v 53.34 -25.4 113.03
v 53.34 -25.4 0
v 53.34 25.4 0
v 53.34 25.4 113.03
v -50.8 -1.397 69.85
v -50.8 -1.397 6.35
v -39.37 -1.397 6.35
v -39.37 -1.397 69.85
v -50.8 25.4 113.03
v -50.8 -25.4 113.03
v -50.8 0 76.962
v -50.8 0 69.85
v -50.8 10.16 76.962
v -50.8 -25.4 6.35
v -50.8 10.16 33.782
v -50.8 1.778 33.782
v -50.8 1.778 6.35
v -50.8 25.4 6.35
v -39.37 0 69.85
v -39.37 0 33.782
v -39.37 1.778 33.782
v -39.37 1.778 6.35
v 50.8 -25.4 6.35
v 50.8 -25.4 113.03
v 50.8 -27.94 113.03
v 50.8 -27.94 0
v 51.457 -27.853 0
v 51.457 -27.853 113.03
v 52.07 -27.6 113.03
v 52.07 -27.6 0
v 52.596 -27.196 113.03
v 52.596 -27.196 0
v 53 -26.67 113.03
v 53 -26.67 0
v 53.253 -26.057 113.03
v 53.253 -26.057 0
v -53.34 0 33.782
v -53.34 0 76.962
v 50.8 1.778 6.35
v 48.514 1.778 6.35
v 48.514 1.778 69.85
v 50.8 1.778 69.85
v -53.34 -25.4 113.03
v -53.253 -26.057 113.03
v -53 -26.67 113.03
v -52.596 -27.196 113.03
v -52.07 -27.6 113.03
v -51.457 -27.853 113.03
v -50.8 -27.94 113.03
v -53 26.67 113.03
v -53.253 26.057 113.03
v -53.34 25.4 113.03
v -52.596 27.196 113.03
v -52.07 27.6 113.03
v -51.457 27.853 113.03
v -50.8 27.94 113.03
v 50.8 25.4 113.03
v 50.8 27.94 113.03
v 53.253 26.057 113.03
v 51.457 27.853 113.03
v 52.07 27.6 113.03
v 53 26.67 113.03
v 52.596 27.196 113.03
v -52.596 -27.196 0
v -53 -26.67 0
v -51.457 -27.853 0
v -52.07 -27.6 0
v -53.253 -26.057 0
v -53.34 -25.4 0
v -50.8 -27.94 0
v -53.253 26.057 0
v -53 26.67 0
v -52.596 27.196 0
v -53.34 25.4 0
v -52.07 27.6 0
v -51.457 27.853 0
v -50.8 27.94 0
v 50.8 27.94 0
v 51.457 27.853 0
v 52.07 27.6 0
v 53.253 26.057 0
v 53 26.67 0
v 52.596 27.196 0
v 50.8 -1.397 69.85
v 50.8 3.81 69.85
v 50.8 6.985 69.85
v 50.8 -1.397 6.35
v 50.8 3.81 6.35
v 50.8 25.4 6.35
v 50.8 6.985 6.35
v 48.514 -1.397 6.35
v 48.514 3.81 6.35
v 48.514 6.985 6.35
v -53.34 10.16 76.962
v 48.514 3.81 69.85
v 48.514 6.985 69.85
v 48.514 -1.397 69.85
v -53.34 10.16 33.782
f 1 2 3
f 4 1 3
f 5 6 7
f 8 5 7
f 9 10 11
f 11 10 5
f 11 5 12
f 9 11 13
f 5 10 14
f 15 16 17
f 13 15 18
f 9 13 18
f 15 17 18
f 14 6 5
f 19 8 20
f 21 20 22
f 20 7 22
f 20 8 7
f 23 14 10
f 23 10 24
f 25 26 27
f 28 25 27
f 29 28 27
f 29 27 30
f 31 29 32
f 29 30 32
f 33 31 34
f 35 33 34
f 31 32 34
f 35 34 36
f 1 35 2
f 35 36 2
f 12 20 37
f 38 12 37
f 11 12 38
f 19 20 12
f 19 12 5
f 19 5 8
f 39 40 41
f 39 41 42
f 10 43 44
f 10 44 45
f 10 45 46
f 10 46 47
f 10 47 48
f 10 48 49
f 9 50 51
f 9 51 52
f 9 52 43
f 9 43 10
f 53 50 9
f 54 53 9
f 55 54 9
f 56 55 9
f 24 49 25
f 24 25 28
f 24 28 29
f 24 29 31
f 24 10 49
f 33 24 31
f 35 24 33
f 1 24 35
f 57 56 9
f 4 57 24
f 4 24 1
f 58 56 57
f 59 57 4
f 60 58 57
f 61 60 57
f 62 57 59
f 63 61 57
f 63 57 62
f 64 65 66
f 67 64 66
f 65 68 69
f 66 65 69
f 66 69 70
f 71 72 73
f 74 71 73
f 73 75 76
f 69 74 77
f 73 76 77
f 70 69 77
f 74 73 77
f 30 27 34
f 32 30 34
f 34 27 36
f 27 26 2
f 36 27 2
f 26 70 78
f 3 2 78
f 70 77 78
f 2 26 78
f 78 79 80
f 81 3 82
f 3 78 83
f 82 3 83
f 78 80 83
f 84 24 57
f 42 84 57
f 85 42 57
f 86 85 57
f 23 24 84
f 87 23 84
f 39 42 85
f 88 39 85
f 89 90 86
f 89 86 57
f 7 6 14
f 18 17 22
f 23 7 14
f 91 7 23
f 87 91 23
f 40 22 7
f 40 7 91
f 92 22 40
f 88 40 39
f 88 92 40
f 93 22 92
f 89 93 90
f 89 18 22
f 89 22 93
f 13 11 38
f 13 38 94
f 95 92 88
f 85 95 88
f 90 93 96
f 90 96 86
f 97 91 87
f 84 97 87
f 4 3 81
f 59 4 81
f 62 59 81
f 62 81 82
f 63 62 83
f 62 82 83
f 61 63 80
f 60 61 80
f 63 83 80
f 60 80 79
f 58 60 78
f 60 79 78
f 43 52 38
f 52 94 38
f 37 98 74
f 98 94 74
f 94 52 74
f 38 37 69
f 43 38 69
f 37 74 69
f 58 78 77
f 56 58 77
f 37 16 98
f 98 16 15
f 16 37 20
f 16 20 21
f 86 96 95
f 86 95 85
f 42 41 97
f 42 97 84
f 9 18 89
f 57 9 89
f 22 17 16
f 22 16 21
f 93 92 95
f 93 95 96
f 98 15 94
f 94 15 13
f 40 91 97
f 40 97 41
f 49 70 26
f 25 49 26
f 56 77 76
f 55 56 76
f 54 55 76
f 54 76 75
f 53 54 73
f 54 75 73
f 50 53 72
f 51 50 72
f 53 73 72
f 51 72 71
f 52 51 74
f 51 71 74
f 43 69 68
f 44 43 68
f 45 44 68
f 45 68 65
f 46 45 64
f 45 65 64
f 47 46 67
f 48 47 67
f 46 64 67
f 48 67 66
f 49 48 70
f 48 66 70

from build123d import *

# Parameters (mm, degrees)
F0_W     = 101.6
F0_H     = 50.8
F1_DEPTH = 113.03
F2_DEPTH = 6.35
F3_W     = 11.43
F3_H     = 3.175
F4_DEPTH = 63.5
F5_W     = 2.286
F5_H     = 3.175
F6_DEPTH = 63.5
F7_W     = 10.16
F7_H     = 43.18
F8_DEPTH = 73.66


# Not quite as in the source:
# - a feature names something its author has since deleted; it is built from what else it names


with BuildPart() as f1:
    # F0 (on Top) → F1 (new body)
    with BuildSketch(Plane.XY):
        with BuildLine():
            ThreePointArc((53.34, 25.4), (52.5960512242, 27.1960512242), (50.8, 27.94))
            Line((50.8, 27.94), (-50.8, 27.94))
            ThreePointArc((-50.8, 27.94), (-52.5960512242, 27.1960512242), (-53.34, 25.4))
            Line((-53.34, 25.4), (-53.34, -25.4))
            ThreePointArc((-53.34, -25.4), (-52.5960512242, -27.1960512242), (-50.8, -27.94))
            Line((-50.8, -27.94), (50.8, -27.94))
            ThreePointArc((50.8, -27.94), (52.5960512242, -27.1960512242), (53.34, -25.4))
            Line((53.34, -25.4), (53.34, 25.4))
        make_face()
        Rectangle(F0_W, F0_H, mode=Mode.SUBTRACT)
    extrude(amount=F1_DEPTH)

    # F0 (on Top) → F2 (join)
    with BuildSketch(Plane.XY):
        with BuildLine():
            ThreePointArc((53.34, 25.4), (52.5960512242, 27.1960512242), (50.8, 27.94))
            Line((50.8, 27.94), (-50.8, 27.94))
            ThreePointArc((-50.8, 27.94), (-52.5960512242, 27.1960512242), (-53.34, 25.4))
            Line((-53.34, 25.4), (-53.34, -25.4))
            ThreePointArc((-53.34, -25.4), (-52.5960512242, -27.1960512242), (-50.8, -27.94))
            Line((-50.8, -27.94), (50.8, -27.94))
            ThreePointArc((50.8, -27.94), (52.5960512242, -27.1960512242), (53.34, -25.4))
            Line((53.34, -25.4), (53.34, 25.4))
        make_face()
        Rectangle(F0_W, F0_H, mode=Mode.SUBTRACT)
        Rectangle(F0_W, F0_H)
    extrude(amount=F2_DEPTH)

    # F3 (on face) → F4 (join)
    with BuildSketch(Plane.XY.offset(6.35)):
        with Locations((-45.085, 0.1905)):
            Rectangle(F3_W, F3_H)
    extrude(amount=F4_DEPTH)

    # F5 (on face) → F6 (join)
    with BuildSketch(Plane.XY.offset(6.35)):
        with Locations((49.657, 5.3975)):
            Rectangle(F5_W, F5_H)
        with Locations((49.657, 0.1905)):
            Rectangle(F5_W, F5_H)
    extrude(amount=F6_DEPTH)

    # F7 (on Right) → F8 (cut)
    with BuildSketch(Plane.YZ):
        with Locations((5.08, 55.372)):
            Rectangle(F7_W, F7_H)
    extrude(amount=-F8_DEPTH, mode=Mode.SUBTRACT)


solid = f1.part
